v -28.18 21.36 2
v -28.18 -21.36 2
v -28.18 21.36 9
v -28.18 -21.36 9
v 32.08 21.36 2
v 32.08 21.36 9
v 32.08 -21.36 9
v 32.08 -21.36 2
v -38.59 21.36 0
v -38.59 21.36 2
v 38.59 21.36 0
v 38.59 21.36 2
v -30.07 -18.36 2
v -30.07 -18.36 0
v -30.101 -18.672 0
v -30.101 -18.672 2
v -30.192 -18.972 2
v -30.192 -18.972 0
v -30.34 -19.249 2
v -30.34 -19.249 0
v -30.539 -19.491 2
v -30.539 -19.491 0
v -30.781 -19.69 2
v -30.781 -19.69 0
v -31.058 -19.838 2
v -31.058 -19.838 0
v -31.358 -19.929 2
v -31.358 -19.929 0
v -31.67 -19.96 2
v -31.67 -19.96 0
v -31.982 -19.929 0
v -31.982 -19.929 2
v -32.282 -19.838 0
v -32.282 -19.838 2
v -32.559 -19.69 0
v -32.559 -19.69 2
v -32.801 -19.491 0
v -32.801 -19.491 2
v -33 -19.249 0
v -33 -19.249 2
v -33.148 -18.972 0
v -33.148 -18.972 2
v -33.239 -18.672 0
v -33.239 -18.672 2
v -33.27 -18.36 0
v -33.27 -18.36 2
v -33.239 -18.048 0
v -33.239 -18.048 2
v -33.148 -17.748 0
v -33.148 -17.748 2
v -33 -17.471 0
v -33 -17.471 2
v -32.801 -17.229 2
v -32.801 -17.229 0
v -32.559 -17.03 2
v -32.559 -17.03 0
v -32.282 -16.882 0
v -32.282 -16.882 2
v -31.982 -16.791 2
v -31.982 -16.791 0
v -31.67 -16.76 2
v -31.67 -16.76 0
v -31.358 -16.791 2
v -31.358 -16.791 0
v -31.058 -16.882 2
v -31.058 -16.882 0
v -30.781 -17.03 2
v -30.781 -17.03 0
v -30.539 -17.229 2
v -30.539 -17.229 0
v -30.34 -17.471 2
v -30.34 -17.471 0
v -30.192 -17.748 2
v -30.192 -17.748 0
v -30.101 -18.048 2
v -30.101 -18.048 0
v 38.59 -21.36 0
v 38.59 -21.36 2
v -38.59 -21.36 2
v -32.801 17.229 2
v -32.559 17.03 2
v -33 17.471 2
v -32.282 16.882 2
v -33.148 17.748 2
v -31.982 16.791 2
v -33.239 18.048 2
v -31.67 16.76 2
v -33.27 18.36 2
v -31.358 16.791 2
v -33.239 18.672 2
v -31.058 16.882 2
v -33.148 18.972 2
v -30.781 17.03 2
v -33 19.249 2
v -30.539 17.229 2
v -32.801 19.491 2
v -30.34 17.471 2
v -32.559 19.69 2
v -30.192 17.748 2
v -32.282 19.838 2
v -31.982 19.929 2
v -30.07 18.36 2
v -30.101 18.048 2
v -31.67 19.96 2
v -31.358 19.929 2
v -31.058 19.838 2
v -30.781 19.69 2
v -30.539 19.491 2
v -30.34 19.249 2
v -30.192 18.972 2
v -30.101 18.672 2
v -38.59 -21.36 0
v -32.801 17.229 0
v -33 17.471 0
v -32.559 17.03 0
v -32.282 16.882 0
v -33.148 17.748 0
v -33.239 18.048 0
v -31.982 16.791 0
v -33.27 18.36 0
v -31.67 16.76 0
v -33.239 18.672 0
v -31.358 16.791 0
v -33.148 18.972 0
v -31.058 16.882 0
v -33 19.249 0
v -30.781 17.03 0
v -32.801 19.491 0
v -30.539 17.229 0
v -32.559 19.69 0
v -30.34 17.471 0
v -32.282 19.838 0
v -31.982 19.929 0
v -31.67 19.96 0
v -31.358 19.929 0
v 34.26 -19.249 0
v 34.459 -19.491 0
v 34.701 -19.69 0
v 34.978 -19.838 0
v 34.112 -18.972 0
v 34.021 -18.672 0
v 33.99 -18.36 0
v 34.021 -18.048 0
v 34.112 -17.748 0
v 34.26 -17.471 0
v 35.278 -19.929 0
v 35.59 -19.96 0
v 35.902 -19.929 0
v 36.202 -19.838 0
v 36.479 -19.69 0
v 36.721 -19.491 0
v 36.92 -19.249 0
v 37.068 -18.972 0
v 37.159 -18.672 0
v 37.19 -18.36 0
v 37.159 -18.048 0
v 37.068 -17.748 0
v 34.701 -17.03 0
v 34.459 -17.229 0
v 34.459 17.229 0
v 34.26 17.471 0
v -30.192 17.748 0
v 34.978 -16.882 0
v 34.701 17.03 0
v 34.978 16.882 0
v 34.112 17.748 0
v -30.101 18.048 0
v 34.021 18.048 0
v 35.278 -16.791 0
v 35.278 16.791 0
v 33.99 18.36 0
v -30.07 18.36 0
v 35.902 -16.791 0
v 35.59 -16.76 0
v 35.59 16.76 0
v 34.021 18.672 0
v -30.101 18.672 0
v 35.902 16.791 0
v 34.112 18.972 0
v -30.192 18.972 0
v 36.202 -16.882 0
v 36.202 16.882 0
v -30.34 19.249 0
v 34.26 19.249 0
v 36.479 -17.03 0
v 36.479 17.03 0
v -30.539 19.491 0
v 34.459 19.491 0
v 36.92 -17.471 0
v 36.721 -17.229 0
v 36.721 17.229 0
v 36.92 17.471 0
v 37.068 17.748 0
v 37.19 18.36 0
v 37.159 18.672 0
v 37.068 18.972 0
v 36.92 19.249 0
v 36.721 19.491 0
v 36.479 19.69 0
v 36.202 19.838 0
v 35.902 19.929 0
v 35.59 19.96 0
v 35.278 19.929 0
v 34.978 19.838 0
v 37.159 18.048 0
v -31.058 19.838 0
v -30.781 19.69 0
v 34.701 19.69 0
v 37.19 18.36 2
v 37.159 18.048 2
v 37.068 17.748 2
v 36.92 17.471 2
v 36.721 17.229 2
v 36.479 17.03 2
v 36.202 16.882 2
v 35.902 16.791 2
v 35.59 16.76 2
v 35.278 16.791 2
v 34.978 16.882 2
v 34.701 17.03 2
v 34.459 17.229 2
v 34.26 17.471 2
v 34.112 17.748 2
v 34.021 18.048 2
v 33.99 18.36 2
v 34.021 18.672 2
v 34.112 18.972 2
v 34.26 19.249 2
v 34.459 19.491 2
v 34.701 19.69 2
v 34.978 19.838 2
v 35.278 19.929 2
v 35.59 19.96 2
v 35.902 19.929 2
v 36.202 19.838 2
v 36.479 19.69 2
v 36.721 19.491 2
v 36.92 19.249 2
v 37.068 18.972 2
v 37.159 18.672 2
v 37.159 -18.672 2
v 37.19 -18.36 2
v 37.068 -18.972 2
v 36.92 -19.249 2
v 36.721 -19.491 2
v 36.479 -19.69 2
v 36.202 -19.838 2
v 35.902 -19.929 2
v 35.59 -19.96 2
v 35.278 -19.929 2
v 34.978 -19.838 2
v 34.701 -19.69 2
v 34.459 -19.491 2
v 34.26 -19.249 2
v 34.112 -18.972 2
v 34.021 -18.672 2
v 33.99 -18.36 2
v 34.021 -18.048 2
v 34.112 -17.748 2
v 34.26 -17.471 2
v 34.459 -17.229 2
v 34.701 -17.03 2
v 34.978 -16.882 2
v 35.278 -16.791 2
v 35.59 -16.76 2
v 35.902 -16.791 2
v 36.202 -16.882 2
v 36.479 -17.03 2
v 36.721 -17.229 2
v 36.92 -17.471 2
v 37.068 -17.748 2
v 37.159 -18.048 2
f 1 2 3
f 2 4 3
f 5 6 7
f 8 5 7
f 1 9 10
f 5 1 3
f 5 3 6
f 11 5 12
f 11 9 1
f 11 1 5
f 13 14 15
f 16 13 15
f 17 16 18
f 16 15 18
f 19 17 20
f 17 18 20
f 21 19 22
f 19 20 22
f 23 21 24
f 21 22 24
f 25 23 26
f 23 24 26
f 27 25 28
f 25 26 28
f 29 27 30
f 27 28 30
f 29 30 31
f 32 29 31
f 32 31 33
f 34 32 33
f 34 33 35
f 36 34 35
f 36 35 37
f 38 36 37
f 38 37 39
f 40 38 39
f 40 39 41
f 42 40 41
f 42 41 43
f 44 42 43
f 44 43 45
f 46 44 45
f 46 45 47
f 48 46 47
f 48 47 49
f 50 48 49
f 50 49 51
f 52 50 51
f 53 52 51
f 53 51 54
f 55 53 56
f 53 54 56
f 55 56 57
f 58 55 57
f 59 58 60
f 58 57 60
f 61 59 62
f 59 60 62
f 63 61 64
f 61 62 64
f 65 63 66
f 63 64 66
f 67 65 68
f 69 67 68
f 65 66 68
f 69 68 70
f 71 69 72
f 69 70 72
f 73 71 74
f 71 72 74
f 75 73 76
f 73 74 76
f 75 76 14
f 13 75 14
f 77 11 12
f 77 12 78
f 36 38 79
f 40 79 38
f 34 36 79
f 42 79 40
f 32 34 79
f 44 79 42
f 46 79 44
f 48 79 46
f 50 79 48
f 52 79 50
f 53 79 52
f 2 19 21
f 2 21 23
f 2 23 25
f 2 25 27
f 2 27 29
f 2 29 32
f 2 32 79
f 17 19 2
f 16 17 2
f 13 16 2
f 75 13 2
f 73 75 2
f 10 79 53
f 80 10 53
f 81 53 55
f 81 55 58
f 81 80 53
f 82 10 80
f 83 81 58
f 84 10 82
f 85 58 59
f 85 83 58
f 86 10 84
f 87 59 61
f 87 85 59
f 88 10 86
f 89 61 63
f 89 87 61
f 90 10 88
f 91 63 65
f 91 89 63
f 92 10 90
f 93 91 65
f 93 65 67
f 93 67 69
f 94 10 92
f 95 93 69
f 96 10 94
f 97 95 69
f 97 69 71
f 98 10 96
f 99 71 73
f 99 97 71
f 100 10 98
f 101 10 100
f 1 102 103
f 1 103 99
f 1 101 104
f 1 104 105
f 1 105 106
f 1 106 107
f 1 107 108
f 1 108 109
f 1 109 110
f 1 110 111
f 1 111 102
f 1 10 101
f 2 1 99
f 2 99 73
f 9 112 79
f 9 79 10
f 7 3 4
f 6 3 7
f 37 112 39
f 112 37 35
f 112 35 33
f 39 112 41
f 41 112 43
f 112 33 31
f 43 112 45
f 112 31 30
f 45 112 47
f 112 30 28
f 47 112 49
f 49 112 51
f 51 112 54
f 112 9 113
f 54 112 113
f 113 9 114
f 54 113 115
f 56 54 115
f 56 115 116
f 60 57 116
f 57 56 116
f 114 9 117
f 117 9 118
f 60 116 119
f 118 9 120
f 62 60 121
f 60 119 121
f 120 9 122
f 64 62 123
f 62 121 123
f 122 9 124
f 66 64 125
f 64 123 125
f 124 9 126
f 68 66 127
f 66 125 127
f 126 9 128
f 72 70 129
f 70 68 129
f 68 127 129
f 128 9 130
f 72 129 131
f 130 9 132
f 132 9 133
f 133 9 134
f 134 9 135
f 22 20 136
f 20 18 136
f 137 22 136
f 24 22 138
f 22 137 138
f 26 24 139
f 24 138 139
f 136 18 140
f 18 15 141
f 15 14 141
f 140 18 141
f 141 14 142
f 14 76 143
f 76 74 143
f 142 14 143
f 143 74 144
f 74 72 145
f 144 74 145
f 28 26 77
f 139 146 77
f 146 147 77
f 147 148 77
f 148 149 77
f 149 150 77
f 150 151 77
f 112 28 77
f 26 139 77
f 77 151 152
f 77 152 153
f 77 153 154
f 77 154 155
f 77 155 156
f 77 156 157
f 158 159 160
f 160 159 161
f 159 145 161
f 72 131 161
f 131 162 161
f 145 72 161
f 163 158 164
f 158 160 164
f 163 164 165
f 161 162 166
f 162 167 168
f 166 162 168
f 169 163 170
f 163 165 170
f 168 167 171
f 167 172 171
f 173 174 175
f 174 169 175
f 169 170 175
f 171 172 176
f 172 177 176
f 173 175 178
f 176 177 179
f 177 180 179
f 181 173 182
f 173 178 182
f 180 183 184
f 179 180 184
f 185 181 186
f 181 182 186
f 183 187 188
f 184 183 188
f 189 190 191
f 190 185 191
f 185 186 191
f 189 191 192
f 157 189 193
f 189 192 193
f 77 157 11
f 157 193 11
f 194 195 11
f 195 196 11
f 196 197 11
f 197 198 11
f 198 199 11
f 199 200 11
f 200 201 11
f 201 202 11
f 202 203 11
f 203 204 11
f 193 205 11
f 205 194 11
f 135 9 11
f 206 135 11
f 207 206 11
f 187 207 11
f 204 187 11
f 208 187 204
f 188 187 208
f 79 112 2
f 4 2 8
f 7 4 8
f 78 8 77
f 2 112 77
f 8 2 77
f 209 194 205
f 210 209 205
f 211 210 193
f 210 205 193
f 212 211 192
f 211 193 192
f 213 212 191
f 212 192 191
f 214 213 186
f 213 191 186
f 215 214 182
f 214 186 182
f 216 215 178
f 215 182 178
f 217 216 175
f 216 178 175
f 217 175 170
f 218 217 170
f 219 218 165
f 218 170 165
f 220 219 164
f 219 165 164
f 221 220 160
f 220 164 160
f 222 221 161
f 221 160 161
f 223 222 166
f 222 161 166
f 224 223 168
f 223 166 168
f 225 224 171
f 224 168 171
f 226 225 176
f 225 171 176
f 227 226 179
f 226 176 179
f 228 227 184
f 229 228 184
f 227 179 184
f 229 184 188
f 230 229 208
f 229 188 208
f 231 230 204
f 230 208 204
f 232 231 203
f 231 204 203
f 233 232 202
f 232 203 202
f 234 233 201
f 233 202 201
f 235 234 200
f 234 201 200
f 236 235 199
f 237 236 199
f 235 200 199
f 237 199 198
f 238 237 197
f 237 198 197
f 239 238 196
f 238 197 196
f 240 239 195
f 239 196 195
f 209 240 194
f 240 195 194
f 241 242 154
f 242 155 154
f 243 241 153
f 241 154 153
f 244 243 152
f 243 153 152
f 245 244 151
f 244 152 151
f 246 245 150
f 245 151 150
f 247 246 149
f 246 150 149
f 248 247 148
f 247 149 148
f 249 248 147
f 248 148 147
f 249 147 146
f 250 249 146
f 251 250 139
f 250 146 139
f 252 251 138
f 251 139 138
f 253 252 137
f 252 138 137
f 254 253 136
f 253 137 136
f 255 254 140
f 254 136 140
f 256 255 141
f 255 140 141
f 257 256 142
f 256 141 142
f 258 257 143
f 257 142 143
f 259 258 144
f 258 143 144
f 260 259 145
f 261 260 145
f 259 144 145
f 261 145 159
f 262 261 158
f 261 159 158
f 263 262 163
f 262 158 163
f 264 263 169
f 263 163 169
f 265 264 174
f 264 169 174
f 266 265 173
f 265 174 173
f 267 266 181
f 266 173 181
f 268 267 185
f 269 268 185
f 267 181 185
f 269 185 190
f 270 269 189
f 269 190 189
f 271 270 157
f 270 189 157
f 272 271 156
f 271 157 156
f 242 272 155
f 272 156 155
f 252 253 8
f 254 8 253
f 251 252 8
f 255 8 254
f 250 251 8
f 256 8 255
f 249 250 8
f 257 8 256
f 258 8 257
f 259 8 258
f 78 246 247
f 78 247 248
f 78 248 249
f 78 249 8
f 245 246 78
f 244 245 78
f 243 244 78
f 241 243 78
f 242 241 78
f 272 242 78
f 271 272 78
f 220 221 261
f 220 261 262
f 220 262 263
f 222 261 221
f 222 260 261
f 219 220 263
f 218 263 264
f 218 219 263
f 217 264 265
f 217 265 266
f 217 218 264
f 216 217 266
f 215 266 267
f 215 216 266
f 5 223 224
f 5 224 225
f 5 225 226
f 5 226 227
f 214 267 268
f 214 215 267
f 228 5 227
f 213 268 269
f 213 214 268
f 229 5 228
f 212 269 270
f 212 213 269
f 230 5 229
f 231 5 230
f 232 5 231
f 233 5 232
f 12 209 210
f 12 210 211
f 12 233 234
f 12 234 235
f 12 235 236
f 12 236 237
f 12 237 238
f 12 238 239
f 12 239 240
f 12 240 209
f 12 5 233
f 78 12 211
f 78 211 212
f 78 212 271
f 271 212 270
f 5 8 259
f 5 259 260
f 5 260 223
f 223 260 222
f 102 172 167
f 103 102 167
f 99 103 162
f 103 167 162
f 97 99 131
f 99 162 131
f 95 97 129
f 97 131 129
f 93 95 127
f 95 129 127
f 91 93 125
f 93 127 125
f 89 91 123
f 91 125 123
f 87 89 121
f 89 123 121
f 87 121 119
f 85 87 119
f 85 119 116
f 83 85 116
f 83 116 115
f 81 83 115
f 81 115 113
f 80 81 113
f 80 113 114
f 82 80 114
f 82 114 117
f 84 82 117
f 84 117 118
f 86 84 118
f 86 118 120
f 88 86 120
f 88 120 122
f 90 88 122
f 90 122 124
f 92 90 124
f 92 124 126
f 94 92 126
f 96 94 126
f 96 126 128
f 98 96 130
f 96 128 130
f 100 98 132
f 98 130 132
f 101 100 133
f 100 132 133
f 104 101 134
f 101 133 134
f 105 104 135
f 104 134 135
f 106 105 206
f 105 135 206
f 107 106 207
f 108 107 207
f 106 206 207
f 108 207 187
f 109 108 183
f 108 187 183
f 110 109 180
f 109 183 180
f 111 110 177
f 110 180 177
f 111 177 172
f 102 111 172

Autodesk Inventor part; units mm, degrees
ref_plane "YZ Plane" through (0, 0, 0) normal (1, 0, 0) x (0, 1, 0)
ref_plane "XZ Plane" through (0, 0, 0) normal (0, 1, 0) x (-1, 0, 0)
ref_plane "XY Plane" through (0, 0, 0) normal (0, 0, 1) x (1, 0, 0)
sketch "Ecran" plane through (0, 0, 0) normal (0, 0, 1) x (1, 0, 0)
  line L0 (-38.59, 21.36) -> (38.59, 21.36)
  line L1 (38.59, 21.36) -> (38.59, 0)
  line L2 (-38.59, 0) -> (-38.59, 21.36)
  circle A0 centre (35.59, 18.36) radius 1.6
  line L3 (-38.59, 0) -> (38.59, 0)
  line L4 (35.59, 21.36) -> (35.59, 0)
  line L5 (-31.67, 21.36) -> (-31.67, 0)
  circle A1 centre (-31.67, 18.36) radius 1.6
  line L6 (-38.59, -21.36) -> (38.59, -21.36)
  line L7 (38.59, -21.36) -> (38.59, 0)
  line L8 (-38.59, 0) -> (-38.59, -21.36)
  circle A2 centre (35.59, -18.36) radius 1.6
  line L9 (35.59, -21.36) -> (35.59, 0)
  line L10 (-31.67, -21.36) -> (-31.67, 0)
  circle A3 centre (-31.67, -18.36) radius 1.6
  line L11 (32.08, 21.36) -> (-28.18, 21.36)
  line L12 (-28.18, 21.36) -> (-28.18, -21.36)
  line L13 (-28.18, -21.36) -> (32.08, -21.36)
  line L14 (32.08, -21.36) -> (32.08, 21.36)
  point P0 (0, 0)
  point P1 (38.59, 10.68)
  point P2 (35.59, 10.68)
  point P3 (38.59, -10.68)
  point P4 (35.59, -10.68)
  dimension "d3" = 3.2
  dimension "d4" = 3
  dimension "d5" = 77.18
  dimension "d6" = 21.36
  dimension "d8" = 67.26
  dimension "d9" = 3
  dimension "d12" = 60.26
  dimension "d13" = 6.51
extrude "Extrusion1" add sketch "Ecran" along normal blind 9 contours L0 L5 A1 L3 L2 | L0 L12 L3 L5 A1 | L3 L10 A3 L6 L8 | L0 L14 L3 L12 | L3 L12 L6 L10 A3 | L0 L4 A0 L3 L14 | L3 L14 L6 L12 | L0 L1 L3 L4 A0 | L3 L9 A2 L6 L14 | L3 L7 L6 L9 A2
sketch "Sketch3" plane through (0, 0, 9) normal (0, 0, 1) x (1, 0, 0)
  line L0 (38.59, 21.36) -> (-38.59, 21.36) projected
  line L1 (-38.59, -21.36) -> (38.59, -21.36) projected
  line L2 (38.59, 21.36) -> (32.08, 21.36)
  line L3 (32.08, 21.36) -> (32.08, -21.36)
  line L4 (32.08, -21.36) -> (38.59, -21.36)
  line L5 (38.59, -21.36) -> (38.59, 21.36)
  line L6 (32.08, -21.36) -> (-28.18, -21.36)
  line L7 (-28.18, -21.36) -> (-28.18, 21.36)
  line L8 (-28.18, 21.36) -> (32.08, 21.36)
  line L9 (32.08, 21.36) -> (32.08, -21.36)
  line L10 (-38.59, 21.36) -> (-38.59, -21.36) projected
  line L11 (-28.18, 21.36) -> (-38.59, 21.36)
  line L12 (-38.59, 21.36) -> (-38.59, -21.36)
  line L13 (-38.59, -21.36) -> (-28.18, -21.36)
  line L14 (-28.18, -21.36) -> (-28.18, 21.36)
  point P0 (0, 0)
  point P1 (38.59, -21.36)
  dimension "d14" = 6.51
  dimension "d15" = 60.26
extrude "Extrusion2" cut sketch "Sketch3" against normal blind 7 contours L5 L1 L3 L0 | L7 L1 L10 L0
properties part number "Ecran" material "Glass"
